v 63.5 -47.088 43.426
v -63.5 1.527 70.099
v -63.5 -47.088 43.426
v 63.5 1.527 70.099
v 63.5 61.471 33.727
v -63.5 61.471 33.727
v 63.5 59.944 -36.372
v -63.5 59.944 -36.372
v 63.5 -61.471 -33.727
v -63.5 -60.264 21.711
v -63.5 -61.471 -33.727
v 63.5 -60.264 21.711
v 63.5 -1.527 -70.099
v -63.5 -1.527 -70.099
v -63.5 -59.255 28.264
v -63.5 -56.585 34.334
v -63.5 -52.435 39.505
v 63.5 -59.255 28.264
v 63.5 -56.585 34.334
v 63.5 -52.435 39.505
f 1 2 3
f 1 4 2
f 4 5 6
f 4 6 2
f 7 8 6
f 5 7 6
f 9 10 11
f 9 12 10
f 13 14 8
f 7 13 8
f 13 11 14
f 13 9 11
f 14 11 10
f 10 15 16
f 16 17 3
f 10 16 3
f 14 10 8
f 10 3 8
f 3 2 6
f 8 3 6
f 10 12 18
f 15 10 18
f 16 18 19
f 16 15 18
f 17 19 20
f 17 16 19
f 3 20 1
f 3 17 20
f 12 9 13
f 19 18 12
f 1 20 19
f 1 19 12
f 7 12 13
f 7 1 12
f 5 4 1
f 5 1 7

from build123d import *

# Parameters (mm, degrees)
F1_DEPTH = 63.5
F2_R     = 25.4


with BuildPart() as f1:
    # F0 (on Right) → F1 (new body, symmetric)
    with BuildSketch(Plane.YZ):
        Polygon((-61.47124, -33.72718), (-1.527025, -70.099246), (59.944215, -36.372065), (61.47124, 33.72718), (1.527025, 70.099246), (-59.944215, 36.372065), align=None)
    extrude(amount=F1_DEPTH, both=True)

    # F2
    f2_edges = [f1.edges().sort_by_distance(p)[0] for p in [
        (0, -59.944215, 36.372065),
    ]]
    fillet(f2_edges, radius=F2_R)


solid = f1.part
